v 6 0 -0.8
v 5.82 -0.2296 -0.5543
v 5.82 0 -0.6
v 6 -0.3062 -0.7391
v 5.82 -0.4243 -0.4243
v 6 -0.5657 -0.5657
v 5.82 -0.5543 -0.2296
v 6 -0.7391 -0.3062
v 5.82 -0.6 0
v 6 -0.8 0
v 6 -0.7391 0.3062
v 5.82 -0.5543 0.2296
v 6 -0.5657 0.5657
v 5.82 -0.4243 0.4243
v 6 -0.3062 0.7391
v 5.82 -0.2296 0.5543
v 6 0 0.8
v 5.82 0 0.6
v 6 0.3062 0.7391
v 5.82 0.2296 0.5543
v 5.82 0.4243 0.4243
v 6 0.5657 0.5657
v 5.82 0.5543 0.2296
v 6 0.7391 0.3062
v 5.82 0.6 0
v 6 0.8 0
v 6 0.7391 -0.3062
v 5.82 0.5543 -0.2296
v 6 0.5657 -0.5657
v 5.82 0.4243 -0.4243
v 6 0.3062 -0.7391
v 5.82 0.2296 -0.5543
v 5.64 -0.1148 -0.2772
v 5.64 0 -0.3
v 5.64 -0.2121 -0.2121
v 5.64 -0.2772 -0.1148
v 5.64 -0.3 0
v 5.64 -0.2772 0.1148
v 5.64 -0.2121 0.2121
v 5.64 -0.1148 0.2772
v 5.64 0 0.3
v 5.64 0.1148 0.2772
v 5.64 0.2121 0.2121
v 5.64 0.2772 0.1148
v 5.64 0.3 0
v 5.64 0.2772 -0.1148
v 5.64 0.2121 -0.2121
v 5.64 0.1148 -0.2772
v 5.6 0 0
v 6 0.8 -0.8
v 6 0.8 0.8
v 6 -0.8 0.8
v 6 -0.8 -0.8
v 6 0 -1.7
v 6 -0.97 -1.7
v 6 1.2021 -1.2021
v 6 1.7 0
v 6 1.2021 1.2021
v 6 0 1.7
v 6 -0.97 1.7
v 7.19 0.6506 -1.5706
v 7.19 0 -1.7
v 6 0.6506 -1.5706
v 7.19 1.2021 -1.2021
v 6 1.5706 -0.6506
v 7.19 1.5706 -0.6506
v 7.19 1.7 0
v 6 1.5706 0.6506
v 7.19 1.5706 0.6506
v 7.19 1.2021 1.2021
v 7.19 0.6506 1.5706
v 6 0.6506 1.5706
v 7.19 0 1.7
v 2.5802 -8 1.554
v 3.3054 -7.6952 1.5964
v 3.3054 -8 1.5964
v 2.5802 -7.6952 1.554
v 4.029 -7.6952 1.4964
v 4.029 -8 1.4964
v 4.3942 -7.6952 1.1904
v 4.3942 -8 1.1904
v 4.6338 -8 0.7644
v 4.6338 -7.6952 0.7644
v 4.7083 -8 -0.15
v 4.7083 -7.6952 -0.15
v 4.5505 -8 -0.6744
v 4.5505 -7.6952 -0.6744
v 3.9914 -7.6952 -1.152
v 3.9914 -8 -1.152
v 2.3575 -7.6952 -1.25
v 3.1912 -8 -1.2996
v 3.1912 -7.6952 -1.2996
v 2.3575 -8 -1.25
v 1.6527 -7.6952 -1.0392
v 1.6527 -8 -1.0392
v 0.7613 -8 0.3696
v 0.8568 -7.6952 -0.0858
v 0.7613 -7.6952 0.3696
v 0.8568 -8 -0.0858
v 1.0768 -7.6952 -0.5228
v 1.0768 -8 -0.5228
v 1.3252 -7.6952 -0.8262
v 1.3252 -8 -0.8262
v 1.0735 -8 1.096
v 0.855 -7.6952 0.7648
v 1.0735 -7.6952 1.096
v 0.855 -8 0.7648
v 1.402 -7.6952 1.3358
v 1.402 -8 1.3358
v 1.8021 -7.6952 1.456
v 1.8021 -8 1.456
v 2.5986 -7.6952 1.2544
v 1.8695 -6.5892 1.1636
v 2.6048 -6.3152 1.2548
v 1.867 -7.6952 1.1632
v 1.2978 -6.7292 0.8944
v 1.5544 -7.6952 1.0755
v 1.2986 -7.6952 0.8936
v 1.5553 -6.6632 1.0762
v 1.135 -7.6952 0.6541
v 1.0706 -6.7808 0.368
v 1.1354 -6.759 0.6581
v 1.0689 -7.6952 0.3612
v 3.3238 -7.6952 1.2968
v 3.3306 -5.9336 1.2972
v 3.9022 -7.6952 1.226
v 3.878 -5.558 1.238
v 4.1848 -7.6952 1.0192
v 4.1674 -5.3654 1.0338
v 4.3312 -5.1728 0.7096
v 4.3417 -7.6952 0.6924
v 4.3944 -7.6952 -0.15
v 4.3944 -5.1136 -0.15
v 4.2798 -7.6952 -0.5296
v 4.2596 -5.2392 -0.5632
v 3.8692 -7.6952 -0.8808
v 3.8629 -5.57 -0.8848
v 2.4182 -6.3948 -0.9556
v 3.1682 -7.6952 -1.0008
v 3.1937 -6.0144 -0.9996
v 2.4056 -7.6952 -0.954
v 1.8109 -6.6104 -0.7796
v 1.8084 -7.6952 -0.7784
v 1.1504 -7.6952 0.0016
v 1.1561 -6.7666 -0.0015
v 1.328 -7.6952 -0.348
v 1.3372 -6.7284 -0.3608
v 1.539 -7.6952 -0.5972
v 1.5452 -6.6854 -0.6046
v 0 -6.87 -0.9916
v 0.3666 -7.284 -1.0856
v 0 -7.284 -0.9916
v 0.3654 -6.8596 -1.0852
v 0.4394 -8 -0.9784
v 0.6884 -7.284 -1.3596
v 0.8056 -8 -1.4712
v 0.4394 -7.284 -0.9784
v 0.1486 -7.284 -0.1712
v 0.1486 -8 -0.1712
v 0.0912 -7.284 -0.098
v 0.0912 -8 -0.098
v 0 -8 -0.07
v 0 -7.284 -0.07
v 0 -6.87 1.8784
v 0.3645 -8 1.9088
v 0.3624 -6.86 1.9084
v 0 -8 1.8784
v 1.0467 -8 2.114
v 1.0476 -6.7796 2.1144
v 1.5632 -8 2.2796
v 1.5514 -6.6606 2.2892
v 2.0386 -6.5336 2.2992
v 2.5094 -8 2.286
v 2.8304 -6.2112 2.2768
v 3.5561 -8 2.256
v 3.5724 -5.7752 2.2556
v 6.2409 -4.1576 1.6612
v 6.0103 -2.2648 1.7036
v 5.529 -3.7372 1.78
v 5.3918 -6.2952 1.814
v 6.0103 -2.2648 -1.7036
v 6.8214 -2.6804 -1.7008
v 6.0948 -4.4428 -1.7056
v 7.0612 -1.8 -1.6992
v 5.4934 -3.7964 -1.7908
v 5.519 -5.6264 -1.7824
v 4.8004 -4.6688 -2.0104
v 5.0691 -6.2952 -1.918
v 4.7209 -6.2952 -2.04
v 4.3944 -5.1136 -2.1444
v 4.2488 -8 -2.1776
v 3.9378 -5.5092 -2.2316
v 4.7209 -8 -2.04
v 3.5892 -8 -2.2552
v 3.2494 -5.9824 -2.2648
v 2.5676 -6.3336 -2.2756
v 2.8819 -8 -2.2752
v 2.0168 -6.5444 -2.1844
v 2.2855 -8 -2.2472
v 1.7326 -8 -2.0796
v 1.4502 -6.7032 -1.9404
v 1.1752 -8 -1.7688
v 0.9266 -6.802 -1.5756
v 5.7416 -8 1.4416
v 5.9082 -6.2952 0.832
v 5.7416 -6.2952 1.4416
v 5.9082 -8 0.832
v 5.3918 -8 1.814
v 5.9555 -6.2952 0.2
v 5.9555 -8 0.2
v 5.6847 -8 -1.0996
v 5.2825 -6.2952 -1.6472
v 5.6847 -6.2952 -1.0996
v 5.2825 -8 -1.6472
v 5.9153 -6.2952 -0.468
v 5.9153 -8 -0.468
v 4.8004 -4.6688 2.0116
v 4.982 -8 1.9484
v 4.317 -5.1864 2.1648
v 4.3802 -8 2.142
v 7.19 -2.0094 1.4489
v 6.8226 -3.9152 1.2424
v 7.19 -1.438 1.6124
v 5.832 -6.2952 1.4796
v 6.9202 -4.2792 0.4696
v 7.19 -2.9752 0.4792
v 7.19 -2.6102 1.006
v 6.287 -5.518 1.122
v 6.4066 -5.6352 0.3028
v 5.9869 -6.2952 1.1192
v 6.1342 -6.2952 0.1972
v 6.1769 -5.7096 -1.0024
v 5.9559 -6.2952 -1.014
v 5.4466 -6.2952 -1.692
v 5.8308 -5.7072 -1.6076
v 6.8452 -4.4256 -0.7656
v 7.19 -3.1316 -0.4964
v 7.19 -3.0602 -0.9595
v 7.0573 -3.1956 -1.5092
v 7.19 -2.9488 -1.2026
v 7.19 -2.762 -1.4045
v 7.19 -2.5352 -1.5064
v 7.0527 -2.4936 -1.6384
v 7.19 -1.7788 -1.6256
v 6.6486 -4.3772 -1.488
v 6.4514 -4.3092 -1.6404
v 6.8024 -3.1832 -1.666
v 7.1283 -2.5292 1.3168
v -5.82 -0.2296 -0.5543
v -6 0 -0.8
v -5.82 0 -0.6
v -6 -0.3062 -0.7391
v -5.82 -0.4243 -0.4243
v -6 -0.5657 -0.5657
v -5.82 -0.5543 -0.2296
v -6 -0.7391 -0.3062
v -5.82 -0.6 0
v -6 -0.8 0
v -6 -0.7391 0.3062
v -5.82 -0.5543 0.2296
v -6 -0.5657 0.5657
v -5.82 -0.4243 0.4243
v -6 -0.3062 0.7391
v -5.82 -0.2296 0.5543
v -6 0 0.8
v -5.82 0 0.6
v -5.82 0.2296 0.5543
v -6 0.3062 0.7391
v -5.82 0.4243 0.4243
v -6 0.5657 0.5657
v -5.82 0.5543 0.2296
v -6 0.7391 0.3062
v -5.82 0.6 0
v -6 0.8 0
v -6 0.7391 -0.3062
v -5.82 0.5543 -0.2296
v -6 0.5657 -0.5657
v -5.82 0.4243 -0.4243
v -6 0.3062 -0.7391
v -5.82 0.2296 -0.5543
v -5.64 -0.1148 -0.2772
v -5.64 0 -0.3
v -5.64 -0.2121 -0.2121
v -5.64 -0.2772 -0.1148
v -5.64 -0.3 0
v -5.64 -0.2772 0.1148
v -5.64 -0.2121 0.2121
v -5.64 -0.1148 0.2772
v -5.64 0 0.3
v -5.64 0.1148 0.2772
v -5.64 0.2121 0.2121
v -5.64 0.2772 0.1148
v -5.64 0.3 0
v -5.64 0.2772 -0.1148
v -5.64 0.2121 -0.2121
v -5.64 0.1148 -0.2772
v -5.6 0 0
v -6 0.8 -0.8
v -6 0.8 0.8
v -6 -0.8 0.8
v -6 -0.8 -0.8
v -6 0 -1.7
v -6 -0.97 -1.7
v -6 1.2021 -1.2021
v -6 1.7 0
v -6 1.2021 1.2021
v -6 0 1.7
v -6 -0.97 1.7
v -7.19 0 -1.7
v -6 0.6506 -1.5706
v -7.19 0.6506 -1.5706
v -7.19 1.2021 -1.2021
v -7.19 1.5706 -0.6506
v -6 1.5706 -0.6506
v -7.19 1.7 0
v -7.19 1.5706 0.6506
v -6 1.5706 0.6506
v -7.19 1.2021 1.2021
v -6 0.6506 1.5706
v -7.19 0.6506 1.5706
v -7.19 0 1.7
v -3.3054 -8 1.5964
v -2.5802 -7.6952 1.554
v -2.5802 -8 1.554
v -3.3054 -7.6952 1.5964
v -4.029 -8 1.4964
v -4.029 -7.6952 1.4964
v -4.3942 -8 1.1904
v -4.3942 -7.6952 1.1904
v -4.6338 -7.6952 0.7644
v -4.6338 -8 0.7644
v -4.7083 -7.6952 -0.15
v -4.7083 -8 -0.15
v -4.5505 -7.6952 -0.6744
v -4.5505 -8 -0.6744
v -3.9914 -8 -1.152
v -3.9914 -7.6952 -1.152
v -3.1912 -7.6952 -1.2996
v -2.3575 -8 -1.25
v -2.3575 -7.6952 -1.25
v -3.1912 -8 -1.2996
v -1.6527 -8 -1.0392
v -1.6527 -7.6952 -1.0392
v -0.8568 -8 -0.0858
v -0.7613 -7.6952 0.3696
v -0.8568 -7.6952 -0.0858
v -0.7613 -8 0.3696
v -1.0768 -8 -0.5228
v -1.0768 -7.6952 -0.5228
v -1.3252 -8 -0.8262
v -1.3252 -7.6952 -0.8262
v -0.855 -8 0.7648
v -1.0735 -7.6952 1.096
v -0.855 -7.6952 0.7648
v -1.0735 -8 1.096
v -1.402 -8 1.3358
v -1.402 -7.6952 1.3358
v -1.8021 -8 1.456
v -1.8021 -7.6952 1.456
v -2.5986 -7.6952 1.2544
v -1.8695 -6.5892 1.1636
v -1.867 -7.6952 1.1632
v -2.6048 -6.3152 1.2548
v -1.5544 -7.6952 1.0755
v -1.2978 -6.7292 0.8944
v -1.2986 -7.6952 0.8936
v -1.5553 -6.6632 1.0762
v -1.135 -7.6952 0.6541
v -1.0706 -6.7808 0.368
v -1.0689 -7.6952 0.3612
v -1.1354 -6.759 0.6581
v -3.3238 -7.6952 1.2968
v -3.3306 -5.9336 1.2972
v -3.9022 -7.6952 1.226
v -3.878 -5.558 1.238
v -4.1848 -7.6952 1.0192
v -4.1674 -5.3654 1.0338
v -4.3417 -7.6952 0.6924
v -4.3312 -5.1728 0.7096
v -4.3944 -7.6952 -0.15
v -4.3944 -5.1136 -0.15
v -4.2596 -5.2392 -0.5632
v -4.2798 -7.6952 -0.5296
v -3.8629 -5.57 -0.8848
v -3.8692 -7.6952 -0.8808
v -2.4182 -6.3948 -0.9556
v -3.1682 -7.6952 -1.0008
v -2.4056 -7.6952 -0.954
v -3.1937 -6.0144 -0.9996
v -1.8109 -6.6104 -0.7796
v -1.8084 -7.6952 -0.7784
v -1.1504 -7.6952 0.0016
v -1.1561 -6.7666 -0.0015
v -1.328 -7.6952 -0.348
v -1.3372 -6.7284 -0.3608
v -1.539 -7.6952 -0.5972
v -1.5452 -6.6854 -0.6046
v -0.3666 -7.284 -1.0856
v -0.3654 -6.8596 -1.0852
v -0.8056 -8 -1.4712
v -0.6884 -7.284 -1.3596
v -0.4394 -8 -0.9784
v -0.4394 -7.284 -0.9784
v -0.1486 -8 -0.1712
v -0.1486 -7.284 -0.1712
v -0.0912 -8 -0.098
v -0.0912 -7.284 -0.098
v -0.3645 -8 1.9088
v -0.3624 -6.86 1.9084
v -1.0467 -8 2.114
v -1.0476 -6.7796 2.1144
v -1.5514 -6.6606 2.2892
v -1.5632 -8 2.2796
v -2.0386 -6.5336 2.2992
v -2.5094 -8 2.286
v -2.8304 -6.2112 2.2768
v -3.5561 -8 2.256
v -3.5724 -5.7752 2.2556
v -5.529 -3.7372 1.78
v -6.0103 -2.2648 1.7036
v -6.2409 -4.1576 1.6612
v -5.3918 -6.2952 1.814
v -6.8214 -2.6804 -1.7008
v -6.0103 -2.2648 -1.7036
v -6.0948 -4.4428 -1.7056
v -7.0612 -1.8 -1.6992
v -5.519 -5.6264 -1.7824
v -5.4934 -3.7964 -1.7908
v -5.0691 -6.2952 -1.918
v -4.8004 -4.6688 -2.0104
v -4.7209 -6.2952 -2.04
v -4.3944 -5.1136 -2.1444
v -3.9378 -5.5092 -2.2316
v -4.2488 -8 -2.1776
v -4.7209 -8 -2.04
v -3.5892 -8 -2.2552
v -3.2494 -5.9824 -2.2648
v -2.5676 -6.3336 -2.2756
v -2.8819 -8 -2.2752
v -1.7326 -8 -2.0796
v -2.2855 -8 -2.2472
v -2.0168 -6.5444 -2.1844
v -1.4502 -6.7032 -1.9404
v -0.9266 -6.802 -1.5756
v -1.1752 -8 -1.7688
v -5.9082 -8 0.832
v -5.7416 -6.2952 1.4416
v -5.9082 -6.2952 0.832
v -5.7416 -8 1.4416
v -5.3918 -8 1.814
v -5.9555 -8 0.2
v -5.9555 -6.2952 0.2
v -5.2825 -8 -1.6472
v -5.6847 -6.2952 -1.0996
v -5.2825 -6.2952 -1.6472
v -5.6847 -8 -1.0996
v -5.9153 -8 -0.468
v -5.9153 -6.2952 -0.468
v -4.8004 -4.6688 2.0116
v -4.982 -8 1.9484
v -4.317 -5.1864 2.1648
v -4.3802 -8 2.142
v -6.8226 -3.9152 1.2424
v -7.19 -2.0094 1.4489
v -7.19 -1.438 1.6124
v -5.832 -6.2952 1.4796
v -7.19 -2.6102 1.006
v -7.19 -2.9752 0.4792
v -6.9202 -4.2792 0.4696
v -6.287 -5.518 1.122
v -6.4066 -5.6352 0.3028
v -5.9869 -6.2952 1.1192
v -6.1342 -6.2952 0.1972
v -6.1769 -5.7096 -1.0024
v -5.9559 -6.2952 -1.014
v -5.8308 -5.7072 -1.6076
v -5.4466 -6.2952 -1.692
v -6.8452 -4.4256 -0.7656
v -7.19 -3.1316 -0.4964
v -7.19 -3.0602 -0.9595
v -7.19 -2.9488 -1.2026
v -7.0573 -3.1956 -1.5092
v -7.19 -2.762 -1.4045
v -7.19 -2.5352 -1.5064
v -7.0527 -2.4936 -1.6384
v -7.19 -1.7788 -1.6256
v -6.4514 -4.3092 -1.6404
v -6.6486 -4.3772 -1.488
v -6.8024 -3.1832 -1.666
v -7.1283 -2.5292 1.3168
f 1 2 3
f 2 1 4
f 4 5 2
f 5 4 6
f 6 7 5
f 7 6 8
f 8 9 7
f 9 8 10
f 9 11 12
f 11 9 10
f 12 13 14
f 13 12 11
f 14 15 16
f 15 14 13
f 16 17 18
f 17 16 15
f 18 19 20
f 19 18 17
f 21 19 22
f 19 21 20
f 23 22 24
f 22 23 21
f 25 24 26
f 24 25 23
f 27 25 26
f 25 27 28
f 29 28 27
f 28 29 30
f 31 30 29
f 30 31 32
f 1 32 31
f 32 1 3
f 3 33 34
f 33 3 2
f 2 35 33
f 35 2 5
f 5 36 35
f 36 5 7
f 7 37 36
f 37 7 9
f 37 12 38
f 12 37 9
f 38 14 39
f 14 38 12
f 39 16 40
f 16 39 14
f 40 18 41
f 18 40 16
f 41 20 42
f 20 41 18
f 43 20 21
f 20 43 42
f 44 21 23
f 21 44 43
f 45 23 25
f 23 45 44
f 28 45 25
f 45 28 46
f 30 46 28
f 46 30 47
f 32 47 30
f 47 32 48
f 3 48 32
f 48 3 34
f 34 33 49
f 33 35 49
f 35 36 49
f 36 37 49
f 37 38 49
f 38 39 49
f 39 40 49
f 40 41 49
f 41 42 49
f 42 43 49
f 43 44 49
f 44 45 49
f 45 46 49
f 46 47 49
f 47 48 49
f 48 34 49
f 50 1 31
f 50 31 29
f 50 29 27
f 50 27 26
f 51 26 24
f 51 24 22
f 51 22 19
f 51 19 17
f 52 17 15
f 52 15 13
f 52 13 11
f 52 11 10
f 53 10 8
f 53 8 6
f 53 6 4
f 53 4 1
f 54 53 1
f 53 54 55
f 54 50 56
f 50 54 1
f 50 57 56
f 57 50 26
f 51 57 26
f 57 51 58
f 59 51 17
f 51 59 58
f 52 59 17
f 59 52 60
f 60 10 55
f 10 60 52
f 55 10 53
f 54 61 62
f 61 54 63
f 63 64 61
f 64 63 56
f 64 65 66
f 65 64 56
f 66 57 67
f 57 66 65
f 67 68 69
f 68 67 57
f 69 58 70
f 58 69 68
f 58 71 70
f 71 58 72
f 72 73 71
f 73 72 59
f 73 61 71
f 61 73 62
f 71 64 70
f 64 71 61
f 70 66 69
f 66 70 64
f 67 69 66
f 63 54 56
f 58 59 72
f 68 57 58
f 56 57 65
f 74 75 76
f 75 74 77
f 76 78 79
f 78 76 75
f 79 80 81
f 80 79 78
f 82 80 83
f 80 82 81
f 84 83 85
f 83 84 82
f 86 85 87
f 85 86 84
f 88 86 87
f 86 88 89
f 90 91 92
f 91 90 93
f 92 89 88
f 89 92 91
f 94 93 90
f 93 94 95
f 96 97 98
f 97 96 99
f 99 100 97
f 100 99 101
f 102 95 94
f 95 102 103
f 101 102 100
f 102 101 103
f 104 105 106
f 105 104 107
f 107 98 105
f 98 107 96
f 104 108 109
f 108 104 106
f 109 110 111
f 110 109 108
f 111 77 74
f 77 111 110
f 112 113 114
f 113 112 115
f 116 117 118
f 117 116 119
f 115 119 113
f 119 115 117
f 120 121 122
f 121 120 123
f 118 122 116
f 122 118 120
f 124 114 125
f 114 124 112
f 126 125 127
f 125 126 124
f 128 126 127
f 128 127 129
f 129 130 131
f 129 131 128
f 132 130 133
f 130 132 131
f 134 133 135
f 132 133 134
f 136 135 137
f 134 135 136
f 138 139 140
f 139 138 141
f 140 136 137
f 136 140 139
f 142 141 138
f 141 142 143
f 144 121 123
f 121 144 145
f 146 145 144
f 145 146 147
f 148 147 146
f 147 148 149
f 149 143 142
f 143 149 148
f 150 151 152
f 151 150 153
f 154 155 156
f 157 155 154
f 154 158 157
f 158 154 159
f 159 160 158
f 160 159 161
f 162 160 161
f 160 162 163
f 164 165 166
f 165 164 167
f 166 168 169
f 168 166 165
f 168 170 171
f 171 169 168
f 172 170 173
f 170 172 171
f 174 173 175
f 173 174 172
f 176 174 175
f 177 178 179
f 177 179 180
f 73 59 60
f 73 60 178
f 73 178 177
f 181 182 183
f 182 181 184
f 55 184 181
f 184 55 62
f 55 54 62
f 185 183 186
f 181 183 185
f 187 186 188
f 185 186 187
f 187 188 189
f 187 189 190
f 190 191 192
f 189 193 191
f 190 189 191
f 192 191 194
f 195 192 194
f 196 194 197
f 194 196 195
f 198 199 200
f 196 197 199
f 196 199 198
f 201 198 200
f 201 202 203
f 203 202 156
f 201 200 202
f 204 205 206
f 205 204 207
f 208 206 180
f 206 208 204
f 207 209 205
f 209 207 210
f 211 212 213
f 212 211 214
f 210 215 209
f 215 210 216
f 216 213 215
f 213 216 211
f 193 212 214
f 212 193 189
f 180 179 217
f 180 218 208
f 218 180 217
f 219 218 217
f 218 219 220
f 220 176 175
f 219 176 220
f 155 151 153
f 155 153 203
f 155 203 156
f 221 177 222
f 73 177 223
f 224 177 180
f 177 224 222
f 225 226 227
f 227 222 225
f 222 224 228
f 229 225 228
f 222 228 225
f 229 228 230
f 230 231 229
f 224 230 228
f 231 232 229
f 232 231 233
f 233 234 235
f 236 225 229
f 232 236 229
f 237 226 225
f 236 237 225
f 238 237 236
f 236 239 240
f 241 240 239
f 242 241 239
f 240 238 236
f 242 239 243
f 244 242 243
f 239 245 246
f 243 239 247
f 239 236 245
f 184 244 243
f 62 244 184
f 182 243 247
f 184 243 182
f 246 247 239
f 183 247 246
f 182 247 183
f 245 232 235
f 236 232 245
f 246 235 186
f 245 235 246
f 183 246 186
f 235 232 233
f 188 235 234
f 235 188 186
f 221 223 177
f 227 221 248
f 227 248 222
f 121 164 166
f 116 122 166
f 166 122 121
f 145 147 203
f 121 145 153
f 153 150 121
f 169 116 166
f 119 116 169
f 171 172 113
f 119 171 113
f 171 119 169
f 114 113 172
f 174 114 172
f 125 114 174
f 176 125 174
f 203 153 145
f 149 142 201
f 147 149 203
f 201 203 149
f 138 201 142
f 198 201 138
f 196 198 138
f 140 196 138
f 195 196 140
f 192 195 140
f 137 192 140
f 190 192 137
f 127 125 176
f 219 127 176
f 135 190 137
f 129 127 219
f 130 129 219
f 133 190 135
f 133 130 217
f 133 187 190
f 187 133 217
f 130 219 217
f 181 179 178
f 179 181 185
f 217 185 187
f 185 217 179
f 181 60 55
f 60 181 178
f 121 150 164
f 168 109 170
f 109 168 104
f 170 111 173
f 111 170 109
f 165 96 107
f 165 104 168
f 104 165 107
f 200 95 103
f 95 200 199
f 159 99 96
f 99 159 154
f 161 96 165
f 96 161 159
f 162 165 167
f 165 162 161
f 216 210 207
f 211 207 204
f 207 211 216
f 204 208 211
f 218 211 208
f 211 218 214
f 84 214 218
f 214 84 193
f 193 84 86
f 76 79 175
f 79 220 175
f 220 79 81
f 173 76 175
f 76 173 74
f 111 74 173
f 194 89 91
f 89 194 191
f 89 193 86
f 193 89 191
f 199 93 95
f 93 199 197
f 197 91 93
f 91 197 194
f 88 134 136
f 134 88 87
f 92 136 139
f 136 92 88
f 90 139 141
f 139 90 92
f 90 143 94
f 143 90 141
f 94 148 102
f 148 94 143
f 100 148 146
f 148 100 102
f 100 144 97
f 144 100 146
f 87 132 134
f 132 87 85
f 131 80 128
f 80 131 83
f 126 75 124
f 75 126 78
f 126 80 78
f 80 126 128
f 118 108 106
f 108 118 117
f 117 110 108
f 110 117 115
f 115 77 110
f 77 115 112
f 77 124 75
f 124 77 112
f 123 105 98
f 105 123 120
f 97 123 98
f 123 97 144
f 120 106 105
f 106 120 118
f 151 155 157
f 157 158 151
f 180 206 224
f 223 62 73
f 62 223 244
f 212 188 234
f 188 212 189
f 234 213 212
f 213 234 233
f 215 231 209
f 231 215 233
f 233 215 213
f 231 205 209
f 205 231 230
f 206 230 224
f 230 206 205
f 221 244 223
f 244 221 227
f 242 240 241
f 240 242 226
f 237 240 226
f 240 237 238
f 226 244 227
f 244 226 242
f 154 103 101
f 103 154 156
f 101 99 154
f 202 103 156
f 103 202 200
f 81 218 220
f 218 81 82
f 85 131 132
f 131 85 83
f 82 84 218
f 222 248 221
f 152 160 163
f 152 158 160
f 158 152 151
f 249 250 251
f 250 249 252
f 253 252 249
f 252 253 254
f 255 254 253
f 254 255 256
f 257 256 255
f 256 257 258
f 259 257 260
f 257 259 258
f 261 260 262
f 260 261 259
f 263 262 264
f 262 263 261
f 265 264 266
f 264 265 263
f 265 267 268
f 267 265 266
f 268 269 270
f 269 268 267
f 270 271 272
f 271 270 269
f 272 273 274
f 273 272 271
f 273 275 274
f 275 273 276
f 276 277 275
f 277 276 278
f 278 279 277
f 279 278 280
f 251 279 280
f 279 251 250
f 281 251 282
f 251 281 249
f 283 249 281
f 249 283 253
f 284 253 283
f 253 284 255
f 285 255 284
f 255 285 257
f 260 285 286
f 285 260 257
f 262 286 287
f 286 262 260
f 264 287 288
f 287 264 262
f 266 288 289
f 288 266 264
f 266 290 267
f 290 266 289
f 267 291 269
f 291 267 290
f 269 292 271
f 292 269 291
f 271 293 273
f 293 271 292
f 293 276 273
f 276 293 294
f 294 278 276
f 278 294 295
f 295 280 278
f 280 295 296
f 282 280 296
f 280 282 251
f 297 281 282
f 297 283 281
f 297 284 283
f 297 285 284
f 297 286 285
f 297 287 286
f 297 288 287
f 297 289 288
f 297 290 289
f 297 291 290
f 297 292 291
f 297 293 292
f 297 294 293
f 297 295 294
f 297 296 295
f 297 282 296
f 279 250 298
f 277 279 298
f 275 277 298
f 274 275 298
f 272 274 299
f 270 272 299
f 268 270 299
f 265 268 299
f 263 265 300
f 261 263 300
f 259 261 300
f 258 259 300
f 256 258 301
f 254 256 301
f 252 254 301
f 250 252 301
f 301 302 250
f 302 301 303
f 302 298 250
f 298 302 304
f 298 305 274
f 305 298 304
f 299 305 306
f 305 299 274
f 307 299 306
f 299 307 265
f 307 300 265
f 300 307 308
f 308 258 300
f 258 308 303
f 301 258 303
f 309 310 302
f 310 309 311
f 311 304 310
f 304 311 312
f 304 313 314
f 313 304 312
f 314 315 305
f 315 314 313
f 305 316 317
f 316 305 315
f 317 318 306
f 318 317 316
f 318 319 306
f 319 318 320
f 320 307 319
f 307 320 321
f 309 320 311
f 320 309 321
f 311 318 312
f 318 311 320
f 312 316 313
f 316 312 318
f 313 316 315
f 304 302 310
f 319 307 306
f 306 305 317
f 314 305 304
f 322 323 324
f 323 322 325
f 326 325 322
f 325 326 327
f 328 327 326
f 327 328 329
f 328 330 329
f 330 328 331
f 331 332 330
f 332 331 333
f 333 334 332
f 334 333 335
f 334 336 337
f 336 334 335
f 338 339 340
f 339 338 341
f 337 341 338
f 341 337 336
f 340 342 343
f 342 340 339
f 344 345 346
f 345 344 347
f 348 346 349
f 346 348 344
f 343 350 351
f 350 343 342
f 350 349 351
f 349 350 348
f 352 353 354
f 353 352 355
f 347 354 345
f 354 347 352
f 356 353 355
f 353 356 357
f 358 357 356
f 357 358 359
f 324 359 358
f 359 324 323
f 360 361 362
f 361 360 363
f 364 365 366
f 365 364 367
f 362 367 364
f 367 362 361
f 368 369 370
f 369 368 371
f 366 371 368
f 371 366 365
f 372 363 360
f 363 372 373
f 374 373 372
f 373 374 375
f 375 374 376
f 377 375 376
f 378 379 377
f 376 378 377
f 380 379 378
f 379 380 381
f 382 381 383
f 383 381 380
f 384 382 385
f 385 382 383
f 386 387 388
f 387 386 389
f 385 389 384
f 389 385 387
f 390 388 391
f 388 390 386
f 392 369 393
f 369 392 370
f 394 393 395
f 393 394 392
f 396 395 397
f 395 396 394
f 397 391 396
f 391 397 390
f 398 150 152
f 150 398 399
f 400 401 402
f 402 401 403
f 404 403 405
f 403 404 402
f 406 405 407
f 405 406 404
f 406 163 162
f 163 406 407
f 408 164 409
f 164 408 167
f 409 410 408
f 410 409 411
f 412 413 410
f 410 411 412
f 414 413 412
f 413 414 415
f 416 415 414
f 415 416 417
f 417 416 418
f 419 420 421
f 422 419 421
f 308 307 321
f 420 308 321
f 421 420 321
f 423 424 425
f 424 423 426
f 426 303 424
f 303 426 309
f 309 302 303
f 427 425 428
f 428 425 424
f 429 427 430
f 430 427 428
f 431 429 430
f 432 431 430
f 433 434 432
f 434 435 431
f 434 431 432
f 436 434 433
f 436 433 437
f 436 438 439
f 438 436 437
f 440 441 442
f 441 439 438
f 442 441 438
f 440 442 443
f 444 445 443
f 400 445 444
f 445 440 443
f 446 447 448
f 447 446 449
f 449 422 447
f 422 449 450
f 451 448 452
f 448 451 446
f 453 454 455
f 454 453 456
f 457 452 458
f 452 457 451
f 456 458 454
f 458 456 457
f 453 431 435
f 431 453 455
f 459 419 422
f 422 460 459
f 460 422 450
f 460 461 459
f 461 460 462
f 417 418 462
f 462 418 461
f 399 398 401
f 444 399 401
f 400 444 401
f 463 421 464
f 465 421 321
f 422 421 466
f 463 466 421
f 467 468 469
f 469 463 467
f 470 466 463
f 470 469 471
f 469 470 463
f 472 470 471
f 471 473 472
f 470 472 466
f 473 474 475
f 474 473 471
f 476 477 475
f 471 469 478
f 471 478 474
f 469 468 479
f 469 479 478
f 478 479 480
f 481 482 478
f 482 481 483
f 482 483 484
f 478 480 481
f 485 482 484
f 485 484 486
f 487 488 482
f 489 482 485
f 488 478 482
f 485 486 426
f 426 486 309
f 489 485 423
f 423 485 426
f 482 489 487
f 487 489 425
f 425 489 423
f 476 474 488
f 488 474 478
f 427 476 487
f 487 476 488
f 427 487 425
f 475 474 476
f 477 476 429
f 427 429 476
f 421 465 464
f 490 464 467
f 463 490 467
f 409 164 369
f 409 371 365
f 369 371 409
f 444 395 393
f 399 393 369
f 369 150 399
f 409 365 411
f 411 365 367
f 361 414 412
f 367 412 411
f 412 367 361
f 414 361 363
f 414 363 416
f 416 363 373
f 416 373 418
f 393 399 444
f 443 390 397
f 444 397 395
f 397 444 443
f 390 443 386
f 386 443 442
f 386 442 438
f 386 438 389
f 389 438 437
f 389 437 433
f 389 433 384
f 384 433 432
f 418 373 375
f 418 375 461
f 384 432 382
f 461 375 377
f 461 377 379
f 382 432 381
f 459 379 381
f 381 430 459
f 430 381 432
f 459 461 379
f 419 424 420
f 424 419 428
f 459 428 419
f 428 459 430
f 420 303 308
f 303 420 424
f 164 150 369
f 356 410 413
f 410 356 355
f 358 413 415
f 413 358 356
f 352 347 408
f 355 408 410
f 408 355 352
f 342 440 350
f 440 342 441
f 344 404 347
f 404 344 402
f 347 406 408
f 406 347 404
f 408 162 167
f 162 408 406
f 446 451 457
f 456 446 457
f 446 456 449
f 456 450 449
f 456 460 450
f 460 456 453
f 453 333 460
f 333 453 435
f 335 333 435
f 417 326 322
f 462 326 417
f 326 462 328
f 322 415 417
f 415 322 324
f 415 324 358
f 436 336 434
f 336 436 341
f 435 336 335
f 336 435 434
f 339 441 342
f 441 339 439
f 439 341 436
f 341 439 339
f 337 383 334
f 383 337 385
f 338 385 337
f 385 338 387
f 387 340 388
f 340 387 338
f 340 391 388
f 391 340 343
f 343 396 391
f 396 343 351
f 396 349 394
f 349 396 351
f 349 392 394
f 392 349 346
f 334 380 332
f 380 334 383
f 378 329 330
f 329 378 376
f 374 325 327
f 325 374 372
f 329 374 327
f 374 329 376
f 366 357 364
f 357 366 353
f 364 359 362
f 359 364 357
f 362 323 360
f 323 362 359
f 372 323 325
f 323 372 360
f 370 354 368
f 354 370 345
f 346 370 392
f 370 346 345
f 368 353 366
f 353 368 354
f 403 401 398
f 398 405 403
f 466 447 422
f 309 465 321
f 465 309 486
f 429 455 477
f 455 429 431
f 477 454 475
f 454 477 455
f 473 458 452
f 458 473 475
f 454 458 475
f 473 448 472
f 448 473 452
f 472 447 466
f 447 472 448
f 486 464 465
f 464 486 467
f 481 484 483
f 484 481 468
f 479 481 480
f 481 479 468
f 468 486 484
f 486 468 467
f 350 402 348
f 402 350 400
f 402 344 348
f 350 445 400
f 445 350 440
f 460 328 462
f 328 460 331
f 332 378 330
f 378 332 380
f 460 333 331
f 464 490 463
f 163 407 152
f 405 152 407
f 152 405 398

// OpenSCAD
use <../lib.scad>
use <s/30170bs01.scad>
function ldraw_lib__30170b() = [
// 0 Minifig Cap Aviator Goggles
// 0 Name: 30170b.dat
// 0 Author: Magnus Forsberg [MagFors]
// 0 !LDRAW_ORG Part UPDATE 2024-07
// 0 !LICENSE Licensed under CC BY 4.0 : see CAreadme.txt
// 
// 0 !HELP Place at [y, z] on [helmet]
// 0 !HELP Place at [8, 0.7] on 30124b
// 0 !HELP Place at [8, -1] on 30171b
// 
// 0 BFC CERTIFY CCW
  [0,"BFC","CERTIFY"],
  [0,"BFC","CCW"],
// 
// 0 !CATEGORY Minifig Headwear
// 0 !KEYWORDS Adventurers, barnstormer, BrickLink 30170, Fighter, glasses, hat
// 0 !KEYWORDS helmet, lenses, Naboo, pilot, pod race, Race, Rebrickable 30170
// 0 !KEYWORDS skullcap, Star Wars
// 
// 0 !HISTORY 2016-03-18 {LEGO Digital Designer} Original part shape
// 0 !HISTORY 2024-07-19 [MagFors] File preparation for LDraw Parts Tracker
// 0 !HISTORY 2024-08-26 [OrionP] Official Update 2024-07
// 
// 1 16 0 0 0 1 0 0 0 1 0 0 0 1 s\30170bs01.dat
  [1,16,0,0,0,1,0,0,0,1,0,0,0,1, ldraw_lib__s__30170bs01()],
// 1 16 0 0 0 -1 0 0 0 1 0 0 0 1 s\30170bs01.dat
  [1,16,0,0,0,-1,0,0,0,1,0,0,0,1, ldraw_lib__s__30170bs01()],
// 5 24 0 2.479 -17.175 0 -4.696 -17.175 2.6764 -.92 -16.952 -2.6764 -.92 -16.952
  [5,24,0,2.479,-17.175,0,-4.696,-17.175,2.6764,-.92,-16.952,-2.6764,-.92,-16.952],
// 5 24 0 2.479 -18.21 0 2.479 -17.175 -.9134 2.713 -17.149 .9134 2.713 -17.149
  [5,24,0,2.479,-18.21,0,2.479,-17.175,-.9134,2.713,-17.149,.9134,2.713,-17.149],
// 5 24 0 .175 -20 0 .175 -18.21 -.2281 .245 -18.21 .2281 .245 -18.21
  [5,24,0,.175,-20,0,.175,-18.21,-.2281,.245,-18.21,.2281,.245,-18.21],
// 5 24 0 -4.696 -17.175 0 -4.696 -20 .9113 -4.772 -20 -.9113 -4.772 -20
  [5,24,0,-4.696,-17.175,0,-4.696,-20,.9113,-4.772,-20,-.9113,-4.772,-20],
];
module ldraw_lib__30170b(step=0, col=false, unit=2/5, alt=false, line=0.2, solid=!$preview)
    makepoly(ldraw_lib__30170b(), step=step, col=col, unit=unit, alt=alt, line=line, solid=solid);
ldraw_lib__30170b(line=0.2);
